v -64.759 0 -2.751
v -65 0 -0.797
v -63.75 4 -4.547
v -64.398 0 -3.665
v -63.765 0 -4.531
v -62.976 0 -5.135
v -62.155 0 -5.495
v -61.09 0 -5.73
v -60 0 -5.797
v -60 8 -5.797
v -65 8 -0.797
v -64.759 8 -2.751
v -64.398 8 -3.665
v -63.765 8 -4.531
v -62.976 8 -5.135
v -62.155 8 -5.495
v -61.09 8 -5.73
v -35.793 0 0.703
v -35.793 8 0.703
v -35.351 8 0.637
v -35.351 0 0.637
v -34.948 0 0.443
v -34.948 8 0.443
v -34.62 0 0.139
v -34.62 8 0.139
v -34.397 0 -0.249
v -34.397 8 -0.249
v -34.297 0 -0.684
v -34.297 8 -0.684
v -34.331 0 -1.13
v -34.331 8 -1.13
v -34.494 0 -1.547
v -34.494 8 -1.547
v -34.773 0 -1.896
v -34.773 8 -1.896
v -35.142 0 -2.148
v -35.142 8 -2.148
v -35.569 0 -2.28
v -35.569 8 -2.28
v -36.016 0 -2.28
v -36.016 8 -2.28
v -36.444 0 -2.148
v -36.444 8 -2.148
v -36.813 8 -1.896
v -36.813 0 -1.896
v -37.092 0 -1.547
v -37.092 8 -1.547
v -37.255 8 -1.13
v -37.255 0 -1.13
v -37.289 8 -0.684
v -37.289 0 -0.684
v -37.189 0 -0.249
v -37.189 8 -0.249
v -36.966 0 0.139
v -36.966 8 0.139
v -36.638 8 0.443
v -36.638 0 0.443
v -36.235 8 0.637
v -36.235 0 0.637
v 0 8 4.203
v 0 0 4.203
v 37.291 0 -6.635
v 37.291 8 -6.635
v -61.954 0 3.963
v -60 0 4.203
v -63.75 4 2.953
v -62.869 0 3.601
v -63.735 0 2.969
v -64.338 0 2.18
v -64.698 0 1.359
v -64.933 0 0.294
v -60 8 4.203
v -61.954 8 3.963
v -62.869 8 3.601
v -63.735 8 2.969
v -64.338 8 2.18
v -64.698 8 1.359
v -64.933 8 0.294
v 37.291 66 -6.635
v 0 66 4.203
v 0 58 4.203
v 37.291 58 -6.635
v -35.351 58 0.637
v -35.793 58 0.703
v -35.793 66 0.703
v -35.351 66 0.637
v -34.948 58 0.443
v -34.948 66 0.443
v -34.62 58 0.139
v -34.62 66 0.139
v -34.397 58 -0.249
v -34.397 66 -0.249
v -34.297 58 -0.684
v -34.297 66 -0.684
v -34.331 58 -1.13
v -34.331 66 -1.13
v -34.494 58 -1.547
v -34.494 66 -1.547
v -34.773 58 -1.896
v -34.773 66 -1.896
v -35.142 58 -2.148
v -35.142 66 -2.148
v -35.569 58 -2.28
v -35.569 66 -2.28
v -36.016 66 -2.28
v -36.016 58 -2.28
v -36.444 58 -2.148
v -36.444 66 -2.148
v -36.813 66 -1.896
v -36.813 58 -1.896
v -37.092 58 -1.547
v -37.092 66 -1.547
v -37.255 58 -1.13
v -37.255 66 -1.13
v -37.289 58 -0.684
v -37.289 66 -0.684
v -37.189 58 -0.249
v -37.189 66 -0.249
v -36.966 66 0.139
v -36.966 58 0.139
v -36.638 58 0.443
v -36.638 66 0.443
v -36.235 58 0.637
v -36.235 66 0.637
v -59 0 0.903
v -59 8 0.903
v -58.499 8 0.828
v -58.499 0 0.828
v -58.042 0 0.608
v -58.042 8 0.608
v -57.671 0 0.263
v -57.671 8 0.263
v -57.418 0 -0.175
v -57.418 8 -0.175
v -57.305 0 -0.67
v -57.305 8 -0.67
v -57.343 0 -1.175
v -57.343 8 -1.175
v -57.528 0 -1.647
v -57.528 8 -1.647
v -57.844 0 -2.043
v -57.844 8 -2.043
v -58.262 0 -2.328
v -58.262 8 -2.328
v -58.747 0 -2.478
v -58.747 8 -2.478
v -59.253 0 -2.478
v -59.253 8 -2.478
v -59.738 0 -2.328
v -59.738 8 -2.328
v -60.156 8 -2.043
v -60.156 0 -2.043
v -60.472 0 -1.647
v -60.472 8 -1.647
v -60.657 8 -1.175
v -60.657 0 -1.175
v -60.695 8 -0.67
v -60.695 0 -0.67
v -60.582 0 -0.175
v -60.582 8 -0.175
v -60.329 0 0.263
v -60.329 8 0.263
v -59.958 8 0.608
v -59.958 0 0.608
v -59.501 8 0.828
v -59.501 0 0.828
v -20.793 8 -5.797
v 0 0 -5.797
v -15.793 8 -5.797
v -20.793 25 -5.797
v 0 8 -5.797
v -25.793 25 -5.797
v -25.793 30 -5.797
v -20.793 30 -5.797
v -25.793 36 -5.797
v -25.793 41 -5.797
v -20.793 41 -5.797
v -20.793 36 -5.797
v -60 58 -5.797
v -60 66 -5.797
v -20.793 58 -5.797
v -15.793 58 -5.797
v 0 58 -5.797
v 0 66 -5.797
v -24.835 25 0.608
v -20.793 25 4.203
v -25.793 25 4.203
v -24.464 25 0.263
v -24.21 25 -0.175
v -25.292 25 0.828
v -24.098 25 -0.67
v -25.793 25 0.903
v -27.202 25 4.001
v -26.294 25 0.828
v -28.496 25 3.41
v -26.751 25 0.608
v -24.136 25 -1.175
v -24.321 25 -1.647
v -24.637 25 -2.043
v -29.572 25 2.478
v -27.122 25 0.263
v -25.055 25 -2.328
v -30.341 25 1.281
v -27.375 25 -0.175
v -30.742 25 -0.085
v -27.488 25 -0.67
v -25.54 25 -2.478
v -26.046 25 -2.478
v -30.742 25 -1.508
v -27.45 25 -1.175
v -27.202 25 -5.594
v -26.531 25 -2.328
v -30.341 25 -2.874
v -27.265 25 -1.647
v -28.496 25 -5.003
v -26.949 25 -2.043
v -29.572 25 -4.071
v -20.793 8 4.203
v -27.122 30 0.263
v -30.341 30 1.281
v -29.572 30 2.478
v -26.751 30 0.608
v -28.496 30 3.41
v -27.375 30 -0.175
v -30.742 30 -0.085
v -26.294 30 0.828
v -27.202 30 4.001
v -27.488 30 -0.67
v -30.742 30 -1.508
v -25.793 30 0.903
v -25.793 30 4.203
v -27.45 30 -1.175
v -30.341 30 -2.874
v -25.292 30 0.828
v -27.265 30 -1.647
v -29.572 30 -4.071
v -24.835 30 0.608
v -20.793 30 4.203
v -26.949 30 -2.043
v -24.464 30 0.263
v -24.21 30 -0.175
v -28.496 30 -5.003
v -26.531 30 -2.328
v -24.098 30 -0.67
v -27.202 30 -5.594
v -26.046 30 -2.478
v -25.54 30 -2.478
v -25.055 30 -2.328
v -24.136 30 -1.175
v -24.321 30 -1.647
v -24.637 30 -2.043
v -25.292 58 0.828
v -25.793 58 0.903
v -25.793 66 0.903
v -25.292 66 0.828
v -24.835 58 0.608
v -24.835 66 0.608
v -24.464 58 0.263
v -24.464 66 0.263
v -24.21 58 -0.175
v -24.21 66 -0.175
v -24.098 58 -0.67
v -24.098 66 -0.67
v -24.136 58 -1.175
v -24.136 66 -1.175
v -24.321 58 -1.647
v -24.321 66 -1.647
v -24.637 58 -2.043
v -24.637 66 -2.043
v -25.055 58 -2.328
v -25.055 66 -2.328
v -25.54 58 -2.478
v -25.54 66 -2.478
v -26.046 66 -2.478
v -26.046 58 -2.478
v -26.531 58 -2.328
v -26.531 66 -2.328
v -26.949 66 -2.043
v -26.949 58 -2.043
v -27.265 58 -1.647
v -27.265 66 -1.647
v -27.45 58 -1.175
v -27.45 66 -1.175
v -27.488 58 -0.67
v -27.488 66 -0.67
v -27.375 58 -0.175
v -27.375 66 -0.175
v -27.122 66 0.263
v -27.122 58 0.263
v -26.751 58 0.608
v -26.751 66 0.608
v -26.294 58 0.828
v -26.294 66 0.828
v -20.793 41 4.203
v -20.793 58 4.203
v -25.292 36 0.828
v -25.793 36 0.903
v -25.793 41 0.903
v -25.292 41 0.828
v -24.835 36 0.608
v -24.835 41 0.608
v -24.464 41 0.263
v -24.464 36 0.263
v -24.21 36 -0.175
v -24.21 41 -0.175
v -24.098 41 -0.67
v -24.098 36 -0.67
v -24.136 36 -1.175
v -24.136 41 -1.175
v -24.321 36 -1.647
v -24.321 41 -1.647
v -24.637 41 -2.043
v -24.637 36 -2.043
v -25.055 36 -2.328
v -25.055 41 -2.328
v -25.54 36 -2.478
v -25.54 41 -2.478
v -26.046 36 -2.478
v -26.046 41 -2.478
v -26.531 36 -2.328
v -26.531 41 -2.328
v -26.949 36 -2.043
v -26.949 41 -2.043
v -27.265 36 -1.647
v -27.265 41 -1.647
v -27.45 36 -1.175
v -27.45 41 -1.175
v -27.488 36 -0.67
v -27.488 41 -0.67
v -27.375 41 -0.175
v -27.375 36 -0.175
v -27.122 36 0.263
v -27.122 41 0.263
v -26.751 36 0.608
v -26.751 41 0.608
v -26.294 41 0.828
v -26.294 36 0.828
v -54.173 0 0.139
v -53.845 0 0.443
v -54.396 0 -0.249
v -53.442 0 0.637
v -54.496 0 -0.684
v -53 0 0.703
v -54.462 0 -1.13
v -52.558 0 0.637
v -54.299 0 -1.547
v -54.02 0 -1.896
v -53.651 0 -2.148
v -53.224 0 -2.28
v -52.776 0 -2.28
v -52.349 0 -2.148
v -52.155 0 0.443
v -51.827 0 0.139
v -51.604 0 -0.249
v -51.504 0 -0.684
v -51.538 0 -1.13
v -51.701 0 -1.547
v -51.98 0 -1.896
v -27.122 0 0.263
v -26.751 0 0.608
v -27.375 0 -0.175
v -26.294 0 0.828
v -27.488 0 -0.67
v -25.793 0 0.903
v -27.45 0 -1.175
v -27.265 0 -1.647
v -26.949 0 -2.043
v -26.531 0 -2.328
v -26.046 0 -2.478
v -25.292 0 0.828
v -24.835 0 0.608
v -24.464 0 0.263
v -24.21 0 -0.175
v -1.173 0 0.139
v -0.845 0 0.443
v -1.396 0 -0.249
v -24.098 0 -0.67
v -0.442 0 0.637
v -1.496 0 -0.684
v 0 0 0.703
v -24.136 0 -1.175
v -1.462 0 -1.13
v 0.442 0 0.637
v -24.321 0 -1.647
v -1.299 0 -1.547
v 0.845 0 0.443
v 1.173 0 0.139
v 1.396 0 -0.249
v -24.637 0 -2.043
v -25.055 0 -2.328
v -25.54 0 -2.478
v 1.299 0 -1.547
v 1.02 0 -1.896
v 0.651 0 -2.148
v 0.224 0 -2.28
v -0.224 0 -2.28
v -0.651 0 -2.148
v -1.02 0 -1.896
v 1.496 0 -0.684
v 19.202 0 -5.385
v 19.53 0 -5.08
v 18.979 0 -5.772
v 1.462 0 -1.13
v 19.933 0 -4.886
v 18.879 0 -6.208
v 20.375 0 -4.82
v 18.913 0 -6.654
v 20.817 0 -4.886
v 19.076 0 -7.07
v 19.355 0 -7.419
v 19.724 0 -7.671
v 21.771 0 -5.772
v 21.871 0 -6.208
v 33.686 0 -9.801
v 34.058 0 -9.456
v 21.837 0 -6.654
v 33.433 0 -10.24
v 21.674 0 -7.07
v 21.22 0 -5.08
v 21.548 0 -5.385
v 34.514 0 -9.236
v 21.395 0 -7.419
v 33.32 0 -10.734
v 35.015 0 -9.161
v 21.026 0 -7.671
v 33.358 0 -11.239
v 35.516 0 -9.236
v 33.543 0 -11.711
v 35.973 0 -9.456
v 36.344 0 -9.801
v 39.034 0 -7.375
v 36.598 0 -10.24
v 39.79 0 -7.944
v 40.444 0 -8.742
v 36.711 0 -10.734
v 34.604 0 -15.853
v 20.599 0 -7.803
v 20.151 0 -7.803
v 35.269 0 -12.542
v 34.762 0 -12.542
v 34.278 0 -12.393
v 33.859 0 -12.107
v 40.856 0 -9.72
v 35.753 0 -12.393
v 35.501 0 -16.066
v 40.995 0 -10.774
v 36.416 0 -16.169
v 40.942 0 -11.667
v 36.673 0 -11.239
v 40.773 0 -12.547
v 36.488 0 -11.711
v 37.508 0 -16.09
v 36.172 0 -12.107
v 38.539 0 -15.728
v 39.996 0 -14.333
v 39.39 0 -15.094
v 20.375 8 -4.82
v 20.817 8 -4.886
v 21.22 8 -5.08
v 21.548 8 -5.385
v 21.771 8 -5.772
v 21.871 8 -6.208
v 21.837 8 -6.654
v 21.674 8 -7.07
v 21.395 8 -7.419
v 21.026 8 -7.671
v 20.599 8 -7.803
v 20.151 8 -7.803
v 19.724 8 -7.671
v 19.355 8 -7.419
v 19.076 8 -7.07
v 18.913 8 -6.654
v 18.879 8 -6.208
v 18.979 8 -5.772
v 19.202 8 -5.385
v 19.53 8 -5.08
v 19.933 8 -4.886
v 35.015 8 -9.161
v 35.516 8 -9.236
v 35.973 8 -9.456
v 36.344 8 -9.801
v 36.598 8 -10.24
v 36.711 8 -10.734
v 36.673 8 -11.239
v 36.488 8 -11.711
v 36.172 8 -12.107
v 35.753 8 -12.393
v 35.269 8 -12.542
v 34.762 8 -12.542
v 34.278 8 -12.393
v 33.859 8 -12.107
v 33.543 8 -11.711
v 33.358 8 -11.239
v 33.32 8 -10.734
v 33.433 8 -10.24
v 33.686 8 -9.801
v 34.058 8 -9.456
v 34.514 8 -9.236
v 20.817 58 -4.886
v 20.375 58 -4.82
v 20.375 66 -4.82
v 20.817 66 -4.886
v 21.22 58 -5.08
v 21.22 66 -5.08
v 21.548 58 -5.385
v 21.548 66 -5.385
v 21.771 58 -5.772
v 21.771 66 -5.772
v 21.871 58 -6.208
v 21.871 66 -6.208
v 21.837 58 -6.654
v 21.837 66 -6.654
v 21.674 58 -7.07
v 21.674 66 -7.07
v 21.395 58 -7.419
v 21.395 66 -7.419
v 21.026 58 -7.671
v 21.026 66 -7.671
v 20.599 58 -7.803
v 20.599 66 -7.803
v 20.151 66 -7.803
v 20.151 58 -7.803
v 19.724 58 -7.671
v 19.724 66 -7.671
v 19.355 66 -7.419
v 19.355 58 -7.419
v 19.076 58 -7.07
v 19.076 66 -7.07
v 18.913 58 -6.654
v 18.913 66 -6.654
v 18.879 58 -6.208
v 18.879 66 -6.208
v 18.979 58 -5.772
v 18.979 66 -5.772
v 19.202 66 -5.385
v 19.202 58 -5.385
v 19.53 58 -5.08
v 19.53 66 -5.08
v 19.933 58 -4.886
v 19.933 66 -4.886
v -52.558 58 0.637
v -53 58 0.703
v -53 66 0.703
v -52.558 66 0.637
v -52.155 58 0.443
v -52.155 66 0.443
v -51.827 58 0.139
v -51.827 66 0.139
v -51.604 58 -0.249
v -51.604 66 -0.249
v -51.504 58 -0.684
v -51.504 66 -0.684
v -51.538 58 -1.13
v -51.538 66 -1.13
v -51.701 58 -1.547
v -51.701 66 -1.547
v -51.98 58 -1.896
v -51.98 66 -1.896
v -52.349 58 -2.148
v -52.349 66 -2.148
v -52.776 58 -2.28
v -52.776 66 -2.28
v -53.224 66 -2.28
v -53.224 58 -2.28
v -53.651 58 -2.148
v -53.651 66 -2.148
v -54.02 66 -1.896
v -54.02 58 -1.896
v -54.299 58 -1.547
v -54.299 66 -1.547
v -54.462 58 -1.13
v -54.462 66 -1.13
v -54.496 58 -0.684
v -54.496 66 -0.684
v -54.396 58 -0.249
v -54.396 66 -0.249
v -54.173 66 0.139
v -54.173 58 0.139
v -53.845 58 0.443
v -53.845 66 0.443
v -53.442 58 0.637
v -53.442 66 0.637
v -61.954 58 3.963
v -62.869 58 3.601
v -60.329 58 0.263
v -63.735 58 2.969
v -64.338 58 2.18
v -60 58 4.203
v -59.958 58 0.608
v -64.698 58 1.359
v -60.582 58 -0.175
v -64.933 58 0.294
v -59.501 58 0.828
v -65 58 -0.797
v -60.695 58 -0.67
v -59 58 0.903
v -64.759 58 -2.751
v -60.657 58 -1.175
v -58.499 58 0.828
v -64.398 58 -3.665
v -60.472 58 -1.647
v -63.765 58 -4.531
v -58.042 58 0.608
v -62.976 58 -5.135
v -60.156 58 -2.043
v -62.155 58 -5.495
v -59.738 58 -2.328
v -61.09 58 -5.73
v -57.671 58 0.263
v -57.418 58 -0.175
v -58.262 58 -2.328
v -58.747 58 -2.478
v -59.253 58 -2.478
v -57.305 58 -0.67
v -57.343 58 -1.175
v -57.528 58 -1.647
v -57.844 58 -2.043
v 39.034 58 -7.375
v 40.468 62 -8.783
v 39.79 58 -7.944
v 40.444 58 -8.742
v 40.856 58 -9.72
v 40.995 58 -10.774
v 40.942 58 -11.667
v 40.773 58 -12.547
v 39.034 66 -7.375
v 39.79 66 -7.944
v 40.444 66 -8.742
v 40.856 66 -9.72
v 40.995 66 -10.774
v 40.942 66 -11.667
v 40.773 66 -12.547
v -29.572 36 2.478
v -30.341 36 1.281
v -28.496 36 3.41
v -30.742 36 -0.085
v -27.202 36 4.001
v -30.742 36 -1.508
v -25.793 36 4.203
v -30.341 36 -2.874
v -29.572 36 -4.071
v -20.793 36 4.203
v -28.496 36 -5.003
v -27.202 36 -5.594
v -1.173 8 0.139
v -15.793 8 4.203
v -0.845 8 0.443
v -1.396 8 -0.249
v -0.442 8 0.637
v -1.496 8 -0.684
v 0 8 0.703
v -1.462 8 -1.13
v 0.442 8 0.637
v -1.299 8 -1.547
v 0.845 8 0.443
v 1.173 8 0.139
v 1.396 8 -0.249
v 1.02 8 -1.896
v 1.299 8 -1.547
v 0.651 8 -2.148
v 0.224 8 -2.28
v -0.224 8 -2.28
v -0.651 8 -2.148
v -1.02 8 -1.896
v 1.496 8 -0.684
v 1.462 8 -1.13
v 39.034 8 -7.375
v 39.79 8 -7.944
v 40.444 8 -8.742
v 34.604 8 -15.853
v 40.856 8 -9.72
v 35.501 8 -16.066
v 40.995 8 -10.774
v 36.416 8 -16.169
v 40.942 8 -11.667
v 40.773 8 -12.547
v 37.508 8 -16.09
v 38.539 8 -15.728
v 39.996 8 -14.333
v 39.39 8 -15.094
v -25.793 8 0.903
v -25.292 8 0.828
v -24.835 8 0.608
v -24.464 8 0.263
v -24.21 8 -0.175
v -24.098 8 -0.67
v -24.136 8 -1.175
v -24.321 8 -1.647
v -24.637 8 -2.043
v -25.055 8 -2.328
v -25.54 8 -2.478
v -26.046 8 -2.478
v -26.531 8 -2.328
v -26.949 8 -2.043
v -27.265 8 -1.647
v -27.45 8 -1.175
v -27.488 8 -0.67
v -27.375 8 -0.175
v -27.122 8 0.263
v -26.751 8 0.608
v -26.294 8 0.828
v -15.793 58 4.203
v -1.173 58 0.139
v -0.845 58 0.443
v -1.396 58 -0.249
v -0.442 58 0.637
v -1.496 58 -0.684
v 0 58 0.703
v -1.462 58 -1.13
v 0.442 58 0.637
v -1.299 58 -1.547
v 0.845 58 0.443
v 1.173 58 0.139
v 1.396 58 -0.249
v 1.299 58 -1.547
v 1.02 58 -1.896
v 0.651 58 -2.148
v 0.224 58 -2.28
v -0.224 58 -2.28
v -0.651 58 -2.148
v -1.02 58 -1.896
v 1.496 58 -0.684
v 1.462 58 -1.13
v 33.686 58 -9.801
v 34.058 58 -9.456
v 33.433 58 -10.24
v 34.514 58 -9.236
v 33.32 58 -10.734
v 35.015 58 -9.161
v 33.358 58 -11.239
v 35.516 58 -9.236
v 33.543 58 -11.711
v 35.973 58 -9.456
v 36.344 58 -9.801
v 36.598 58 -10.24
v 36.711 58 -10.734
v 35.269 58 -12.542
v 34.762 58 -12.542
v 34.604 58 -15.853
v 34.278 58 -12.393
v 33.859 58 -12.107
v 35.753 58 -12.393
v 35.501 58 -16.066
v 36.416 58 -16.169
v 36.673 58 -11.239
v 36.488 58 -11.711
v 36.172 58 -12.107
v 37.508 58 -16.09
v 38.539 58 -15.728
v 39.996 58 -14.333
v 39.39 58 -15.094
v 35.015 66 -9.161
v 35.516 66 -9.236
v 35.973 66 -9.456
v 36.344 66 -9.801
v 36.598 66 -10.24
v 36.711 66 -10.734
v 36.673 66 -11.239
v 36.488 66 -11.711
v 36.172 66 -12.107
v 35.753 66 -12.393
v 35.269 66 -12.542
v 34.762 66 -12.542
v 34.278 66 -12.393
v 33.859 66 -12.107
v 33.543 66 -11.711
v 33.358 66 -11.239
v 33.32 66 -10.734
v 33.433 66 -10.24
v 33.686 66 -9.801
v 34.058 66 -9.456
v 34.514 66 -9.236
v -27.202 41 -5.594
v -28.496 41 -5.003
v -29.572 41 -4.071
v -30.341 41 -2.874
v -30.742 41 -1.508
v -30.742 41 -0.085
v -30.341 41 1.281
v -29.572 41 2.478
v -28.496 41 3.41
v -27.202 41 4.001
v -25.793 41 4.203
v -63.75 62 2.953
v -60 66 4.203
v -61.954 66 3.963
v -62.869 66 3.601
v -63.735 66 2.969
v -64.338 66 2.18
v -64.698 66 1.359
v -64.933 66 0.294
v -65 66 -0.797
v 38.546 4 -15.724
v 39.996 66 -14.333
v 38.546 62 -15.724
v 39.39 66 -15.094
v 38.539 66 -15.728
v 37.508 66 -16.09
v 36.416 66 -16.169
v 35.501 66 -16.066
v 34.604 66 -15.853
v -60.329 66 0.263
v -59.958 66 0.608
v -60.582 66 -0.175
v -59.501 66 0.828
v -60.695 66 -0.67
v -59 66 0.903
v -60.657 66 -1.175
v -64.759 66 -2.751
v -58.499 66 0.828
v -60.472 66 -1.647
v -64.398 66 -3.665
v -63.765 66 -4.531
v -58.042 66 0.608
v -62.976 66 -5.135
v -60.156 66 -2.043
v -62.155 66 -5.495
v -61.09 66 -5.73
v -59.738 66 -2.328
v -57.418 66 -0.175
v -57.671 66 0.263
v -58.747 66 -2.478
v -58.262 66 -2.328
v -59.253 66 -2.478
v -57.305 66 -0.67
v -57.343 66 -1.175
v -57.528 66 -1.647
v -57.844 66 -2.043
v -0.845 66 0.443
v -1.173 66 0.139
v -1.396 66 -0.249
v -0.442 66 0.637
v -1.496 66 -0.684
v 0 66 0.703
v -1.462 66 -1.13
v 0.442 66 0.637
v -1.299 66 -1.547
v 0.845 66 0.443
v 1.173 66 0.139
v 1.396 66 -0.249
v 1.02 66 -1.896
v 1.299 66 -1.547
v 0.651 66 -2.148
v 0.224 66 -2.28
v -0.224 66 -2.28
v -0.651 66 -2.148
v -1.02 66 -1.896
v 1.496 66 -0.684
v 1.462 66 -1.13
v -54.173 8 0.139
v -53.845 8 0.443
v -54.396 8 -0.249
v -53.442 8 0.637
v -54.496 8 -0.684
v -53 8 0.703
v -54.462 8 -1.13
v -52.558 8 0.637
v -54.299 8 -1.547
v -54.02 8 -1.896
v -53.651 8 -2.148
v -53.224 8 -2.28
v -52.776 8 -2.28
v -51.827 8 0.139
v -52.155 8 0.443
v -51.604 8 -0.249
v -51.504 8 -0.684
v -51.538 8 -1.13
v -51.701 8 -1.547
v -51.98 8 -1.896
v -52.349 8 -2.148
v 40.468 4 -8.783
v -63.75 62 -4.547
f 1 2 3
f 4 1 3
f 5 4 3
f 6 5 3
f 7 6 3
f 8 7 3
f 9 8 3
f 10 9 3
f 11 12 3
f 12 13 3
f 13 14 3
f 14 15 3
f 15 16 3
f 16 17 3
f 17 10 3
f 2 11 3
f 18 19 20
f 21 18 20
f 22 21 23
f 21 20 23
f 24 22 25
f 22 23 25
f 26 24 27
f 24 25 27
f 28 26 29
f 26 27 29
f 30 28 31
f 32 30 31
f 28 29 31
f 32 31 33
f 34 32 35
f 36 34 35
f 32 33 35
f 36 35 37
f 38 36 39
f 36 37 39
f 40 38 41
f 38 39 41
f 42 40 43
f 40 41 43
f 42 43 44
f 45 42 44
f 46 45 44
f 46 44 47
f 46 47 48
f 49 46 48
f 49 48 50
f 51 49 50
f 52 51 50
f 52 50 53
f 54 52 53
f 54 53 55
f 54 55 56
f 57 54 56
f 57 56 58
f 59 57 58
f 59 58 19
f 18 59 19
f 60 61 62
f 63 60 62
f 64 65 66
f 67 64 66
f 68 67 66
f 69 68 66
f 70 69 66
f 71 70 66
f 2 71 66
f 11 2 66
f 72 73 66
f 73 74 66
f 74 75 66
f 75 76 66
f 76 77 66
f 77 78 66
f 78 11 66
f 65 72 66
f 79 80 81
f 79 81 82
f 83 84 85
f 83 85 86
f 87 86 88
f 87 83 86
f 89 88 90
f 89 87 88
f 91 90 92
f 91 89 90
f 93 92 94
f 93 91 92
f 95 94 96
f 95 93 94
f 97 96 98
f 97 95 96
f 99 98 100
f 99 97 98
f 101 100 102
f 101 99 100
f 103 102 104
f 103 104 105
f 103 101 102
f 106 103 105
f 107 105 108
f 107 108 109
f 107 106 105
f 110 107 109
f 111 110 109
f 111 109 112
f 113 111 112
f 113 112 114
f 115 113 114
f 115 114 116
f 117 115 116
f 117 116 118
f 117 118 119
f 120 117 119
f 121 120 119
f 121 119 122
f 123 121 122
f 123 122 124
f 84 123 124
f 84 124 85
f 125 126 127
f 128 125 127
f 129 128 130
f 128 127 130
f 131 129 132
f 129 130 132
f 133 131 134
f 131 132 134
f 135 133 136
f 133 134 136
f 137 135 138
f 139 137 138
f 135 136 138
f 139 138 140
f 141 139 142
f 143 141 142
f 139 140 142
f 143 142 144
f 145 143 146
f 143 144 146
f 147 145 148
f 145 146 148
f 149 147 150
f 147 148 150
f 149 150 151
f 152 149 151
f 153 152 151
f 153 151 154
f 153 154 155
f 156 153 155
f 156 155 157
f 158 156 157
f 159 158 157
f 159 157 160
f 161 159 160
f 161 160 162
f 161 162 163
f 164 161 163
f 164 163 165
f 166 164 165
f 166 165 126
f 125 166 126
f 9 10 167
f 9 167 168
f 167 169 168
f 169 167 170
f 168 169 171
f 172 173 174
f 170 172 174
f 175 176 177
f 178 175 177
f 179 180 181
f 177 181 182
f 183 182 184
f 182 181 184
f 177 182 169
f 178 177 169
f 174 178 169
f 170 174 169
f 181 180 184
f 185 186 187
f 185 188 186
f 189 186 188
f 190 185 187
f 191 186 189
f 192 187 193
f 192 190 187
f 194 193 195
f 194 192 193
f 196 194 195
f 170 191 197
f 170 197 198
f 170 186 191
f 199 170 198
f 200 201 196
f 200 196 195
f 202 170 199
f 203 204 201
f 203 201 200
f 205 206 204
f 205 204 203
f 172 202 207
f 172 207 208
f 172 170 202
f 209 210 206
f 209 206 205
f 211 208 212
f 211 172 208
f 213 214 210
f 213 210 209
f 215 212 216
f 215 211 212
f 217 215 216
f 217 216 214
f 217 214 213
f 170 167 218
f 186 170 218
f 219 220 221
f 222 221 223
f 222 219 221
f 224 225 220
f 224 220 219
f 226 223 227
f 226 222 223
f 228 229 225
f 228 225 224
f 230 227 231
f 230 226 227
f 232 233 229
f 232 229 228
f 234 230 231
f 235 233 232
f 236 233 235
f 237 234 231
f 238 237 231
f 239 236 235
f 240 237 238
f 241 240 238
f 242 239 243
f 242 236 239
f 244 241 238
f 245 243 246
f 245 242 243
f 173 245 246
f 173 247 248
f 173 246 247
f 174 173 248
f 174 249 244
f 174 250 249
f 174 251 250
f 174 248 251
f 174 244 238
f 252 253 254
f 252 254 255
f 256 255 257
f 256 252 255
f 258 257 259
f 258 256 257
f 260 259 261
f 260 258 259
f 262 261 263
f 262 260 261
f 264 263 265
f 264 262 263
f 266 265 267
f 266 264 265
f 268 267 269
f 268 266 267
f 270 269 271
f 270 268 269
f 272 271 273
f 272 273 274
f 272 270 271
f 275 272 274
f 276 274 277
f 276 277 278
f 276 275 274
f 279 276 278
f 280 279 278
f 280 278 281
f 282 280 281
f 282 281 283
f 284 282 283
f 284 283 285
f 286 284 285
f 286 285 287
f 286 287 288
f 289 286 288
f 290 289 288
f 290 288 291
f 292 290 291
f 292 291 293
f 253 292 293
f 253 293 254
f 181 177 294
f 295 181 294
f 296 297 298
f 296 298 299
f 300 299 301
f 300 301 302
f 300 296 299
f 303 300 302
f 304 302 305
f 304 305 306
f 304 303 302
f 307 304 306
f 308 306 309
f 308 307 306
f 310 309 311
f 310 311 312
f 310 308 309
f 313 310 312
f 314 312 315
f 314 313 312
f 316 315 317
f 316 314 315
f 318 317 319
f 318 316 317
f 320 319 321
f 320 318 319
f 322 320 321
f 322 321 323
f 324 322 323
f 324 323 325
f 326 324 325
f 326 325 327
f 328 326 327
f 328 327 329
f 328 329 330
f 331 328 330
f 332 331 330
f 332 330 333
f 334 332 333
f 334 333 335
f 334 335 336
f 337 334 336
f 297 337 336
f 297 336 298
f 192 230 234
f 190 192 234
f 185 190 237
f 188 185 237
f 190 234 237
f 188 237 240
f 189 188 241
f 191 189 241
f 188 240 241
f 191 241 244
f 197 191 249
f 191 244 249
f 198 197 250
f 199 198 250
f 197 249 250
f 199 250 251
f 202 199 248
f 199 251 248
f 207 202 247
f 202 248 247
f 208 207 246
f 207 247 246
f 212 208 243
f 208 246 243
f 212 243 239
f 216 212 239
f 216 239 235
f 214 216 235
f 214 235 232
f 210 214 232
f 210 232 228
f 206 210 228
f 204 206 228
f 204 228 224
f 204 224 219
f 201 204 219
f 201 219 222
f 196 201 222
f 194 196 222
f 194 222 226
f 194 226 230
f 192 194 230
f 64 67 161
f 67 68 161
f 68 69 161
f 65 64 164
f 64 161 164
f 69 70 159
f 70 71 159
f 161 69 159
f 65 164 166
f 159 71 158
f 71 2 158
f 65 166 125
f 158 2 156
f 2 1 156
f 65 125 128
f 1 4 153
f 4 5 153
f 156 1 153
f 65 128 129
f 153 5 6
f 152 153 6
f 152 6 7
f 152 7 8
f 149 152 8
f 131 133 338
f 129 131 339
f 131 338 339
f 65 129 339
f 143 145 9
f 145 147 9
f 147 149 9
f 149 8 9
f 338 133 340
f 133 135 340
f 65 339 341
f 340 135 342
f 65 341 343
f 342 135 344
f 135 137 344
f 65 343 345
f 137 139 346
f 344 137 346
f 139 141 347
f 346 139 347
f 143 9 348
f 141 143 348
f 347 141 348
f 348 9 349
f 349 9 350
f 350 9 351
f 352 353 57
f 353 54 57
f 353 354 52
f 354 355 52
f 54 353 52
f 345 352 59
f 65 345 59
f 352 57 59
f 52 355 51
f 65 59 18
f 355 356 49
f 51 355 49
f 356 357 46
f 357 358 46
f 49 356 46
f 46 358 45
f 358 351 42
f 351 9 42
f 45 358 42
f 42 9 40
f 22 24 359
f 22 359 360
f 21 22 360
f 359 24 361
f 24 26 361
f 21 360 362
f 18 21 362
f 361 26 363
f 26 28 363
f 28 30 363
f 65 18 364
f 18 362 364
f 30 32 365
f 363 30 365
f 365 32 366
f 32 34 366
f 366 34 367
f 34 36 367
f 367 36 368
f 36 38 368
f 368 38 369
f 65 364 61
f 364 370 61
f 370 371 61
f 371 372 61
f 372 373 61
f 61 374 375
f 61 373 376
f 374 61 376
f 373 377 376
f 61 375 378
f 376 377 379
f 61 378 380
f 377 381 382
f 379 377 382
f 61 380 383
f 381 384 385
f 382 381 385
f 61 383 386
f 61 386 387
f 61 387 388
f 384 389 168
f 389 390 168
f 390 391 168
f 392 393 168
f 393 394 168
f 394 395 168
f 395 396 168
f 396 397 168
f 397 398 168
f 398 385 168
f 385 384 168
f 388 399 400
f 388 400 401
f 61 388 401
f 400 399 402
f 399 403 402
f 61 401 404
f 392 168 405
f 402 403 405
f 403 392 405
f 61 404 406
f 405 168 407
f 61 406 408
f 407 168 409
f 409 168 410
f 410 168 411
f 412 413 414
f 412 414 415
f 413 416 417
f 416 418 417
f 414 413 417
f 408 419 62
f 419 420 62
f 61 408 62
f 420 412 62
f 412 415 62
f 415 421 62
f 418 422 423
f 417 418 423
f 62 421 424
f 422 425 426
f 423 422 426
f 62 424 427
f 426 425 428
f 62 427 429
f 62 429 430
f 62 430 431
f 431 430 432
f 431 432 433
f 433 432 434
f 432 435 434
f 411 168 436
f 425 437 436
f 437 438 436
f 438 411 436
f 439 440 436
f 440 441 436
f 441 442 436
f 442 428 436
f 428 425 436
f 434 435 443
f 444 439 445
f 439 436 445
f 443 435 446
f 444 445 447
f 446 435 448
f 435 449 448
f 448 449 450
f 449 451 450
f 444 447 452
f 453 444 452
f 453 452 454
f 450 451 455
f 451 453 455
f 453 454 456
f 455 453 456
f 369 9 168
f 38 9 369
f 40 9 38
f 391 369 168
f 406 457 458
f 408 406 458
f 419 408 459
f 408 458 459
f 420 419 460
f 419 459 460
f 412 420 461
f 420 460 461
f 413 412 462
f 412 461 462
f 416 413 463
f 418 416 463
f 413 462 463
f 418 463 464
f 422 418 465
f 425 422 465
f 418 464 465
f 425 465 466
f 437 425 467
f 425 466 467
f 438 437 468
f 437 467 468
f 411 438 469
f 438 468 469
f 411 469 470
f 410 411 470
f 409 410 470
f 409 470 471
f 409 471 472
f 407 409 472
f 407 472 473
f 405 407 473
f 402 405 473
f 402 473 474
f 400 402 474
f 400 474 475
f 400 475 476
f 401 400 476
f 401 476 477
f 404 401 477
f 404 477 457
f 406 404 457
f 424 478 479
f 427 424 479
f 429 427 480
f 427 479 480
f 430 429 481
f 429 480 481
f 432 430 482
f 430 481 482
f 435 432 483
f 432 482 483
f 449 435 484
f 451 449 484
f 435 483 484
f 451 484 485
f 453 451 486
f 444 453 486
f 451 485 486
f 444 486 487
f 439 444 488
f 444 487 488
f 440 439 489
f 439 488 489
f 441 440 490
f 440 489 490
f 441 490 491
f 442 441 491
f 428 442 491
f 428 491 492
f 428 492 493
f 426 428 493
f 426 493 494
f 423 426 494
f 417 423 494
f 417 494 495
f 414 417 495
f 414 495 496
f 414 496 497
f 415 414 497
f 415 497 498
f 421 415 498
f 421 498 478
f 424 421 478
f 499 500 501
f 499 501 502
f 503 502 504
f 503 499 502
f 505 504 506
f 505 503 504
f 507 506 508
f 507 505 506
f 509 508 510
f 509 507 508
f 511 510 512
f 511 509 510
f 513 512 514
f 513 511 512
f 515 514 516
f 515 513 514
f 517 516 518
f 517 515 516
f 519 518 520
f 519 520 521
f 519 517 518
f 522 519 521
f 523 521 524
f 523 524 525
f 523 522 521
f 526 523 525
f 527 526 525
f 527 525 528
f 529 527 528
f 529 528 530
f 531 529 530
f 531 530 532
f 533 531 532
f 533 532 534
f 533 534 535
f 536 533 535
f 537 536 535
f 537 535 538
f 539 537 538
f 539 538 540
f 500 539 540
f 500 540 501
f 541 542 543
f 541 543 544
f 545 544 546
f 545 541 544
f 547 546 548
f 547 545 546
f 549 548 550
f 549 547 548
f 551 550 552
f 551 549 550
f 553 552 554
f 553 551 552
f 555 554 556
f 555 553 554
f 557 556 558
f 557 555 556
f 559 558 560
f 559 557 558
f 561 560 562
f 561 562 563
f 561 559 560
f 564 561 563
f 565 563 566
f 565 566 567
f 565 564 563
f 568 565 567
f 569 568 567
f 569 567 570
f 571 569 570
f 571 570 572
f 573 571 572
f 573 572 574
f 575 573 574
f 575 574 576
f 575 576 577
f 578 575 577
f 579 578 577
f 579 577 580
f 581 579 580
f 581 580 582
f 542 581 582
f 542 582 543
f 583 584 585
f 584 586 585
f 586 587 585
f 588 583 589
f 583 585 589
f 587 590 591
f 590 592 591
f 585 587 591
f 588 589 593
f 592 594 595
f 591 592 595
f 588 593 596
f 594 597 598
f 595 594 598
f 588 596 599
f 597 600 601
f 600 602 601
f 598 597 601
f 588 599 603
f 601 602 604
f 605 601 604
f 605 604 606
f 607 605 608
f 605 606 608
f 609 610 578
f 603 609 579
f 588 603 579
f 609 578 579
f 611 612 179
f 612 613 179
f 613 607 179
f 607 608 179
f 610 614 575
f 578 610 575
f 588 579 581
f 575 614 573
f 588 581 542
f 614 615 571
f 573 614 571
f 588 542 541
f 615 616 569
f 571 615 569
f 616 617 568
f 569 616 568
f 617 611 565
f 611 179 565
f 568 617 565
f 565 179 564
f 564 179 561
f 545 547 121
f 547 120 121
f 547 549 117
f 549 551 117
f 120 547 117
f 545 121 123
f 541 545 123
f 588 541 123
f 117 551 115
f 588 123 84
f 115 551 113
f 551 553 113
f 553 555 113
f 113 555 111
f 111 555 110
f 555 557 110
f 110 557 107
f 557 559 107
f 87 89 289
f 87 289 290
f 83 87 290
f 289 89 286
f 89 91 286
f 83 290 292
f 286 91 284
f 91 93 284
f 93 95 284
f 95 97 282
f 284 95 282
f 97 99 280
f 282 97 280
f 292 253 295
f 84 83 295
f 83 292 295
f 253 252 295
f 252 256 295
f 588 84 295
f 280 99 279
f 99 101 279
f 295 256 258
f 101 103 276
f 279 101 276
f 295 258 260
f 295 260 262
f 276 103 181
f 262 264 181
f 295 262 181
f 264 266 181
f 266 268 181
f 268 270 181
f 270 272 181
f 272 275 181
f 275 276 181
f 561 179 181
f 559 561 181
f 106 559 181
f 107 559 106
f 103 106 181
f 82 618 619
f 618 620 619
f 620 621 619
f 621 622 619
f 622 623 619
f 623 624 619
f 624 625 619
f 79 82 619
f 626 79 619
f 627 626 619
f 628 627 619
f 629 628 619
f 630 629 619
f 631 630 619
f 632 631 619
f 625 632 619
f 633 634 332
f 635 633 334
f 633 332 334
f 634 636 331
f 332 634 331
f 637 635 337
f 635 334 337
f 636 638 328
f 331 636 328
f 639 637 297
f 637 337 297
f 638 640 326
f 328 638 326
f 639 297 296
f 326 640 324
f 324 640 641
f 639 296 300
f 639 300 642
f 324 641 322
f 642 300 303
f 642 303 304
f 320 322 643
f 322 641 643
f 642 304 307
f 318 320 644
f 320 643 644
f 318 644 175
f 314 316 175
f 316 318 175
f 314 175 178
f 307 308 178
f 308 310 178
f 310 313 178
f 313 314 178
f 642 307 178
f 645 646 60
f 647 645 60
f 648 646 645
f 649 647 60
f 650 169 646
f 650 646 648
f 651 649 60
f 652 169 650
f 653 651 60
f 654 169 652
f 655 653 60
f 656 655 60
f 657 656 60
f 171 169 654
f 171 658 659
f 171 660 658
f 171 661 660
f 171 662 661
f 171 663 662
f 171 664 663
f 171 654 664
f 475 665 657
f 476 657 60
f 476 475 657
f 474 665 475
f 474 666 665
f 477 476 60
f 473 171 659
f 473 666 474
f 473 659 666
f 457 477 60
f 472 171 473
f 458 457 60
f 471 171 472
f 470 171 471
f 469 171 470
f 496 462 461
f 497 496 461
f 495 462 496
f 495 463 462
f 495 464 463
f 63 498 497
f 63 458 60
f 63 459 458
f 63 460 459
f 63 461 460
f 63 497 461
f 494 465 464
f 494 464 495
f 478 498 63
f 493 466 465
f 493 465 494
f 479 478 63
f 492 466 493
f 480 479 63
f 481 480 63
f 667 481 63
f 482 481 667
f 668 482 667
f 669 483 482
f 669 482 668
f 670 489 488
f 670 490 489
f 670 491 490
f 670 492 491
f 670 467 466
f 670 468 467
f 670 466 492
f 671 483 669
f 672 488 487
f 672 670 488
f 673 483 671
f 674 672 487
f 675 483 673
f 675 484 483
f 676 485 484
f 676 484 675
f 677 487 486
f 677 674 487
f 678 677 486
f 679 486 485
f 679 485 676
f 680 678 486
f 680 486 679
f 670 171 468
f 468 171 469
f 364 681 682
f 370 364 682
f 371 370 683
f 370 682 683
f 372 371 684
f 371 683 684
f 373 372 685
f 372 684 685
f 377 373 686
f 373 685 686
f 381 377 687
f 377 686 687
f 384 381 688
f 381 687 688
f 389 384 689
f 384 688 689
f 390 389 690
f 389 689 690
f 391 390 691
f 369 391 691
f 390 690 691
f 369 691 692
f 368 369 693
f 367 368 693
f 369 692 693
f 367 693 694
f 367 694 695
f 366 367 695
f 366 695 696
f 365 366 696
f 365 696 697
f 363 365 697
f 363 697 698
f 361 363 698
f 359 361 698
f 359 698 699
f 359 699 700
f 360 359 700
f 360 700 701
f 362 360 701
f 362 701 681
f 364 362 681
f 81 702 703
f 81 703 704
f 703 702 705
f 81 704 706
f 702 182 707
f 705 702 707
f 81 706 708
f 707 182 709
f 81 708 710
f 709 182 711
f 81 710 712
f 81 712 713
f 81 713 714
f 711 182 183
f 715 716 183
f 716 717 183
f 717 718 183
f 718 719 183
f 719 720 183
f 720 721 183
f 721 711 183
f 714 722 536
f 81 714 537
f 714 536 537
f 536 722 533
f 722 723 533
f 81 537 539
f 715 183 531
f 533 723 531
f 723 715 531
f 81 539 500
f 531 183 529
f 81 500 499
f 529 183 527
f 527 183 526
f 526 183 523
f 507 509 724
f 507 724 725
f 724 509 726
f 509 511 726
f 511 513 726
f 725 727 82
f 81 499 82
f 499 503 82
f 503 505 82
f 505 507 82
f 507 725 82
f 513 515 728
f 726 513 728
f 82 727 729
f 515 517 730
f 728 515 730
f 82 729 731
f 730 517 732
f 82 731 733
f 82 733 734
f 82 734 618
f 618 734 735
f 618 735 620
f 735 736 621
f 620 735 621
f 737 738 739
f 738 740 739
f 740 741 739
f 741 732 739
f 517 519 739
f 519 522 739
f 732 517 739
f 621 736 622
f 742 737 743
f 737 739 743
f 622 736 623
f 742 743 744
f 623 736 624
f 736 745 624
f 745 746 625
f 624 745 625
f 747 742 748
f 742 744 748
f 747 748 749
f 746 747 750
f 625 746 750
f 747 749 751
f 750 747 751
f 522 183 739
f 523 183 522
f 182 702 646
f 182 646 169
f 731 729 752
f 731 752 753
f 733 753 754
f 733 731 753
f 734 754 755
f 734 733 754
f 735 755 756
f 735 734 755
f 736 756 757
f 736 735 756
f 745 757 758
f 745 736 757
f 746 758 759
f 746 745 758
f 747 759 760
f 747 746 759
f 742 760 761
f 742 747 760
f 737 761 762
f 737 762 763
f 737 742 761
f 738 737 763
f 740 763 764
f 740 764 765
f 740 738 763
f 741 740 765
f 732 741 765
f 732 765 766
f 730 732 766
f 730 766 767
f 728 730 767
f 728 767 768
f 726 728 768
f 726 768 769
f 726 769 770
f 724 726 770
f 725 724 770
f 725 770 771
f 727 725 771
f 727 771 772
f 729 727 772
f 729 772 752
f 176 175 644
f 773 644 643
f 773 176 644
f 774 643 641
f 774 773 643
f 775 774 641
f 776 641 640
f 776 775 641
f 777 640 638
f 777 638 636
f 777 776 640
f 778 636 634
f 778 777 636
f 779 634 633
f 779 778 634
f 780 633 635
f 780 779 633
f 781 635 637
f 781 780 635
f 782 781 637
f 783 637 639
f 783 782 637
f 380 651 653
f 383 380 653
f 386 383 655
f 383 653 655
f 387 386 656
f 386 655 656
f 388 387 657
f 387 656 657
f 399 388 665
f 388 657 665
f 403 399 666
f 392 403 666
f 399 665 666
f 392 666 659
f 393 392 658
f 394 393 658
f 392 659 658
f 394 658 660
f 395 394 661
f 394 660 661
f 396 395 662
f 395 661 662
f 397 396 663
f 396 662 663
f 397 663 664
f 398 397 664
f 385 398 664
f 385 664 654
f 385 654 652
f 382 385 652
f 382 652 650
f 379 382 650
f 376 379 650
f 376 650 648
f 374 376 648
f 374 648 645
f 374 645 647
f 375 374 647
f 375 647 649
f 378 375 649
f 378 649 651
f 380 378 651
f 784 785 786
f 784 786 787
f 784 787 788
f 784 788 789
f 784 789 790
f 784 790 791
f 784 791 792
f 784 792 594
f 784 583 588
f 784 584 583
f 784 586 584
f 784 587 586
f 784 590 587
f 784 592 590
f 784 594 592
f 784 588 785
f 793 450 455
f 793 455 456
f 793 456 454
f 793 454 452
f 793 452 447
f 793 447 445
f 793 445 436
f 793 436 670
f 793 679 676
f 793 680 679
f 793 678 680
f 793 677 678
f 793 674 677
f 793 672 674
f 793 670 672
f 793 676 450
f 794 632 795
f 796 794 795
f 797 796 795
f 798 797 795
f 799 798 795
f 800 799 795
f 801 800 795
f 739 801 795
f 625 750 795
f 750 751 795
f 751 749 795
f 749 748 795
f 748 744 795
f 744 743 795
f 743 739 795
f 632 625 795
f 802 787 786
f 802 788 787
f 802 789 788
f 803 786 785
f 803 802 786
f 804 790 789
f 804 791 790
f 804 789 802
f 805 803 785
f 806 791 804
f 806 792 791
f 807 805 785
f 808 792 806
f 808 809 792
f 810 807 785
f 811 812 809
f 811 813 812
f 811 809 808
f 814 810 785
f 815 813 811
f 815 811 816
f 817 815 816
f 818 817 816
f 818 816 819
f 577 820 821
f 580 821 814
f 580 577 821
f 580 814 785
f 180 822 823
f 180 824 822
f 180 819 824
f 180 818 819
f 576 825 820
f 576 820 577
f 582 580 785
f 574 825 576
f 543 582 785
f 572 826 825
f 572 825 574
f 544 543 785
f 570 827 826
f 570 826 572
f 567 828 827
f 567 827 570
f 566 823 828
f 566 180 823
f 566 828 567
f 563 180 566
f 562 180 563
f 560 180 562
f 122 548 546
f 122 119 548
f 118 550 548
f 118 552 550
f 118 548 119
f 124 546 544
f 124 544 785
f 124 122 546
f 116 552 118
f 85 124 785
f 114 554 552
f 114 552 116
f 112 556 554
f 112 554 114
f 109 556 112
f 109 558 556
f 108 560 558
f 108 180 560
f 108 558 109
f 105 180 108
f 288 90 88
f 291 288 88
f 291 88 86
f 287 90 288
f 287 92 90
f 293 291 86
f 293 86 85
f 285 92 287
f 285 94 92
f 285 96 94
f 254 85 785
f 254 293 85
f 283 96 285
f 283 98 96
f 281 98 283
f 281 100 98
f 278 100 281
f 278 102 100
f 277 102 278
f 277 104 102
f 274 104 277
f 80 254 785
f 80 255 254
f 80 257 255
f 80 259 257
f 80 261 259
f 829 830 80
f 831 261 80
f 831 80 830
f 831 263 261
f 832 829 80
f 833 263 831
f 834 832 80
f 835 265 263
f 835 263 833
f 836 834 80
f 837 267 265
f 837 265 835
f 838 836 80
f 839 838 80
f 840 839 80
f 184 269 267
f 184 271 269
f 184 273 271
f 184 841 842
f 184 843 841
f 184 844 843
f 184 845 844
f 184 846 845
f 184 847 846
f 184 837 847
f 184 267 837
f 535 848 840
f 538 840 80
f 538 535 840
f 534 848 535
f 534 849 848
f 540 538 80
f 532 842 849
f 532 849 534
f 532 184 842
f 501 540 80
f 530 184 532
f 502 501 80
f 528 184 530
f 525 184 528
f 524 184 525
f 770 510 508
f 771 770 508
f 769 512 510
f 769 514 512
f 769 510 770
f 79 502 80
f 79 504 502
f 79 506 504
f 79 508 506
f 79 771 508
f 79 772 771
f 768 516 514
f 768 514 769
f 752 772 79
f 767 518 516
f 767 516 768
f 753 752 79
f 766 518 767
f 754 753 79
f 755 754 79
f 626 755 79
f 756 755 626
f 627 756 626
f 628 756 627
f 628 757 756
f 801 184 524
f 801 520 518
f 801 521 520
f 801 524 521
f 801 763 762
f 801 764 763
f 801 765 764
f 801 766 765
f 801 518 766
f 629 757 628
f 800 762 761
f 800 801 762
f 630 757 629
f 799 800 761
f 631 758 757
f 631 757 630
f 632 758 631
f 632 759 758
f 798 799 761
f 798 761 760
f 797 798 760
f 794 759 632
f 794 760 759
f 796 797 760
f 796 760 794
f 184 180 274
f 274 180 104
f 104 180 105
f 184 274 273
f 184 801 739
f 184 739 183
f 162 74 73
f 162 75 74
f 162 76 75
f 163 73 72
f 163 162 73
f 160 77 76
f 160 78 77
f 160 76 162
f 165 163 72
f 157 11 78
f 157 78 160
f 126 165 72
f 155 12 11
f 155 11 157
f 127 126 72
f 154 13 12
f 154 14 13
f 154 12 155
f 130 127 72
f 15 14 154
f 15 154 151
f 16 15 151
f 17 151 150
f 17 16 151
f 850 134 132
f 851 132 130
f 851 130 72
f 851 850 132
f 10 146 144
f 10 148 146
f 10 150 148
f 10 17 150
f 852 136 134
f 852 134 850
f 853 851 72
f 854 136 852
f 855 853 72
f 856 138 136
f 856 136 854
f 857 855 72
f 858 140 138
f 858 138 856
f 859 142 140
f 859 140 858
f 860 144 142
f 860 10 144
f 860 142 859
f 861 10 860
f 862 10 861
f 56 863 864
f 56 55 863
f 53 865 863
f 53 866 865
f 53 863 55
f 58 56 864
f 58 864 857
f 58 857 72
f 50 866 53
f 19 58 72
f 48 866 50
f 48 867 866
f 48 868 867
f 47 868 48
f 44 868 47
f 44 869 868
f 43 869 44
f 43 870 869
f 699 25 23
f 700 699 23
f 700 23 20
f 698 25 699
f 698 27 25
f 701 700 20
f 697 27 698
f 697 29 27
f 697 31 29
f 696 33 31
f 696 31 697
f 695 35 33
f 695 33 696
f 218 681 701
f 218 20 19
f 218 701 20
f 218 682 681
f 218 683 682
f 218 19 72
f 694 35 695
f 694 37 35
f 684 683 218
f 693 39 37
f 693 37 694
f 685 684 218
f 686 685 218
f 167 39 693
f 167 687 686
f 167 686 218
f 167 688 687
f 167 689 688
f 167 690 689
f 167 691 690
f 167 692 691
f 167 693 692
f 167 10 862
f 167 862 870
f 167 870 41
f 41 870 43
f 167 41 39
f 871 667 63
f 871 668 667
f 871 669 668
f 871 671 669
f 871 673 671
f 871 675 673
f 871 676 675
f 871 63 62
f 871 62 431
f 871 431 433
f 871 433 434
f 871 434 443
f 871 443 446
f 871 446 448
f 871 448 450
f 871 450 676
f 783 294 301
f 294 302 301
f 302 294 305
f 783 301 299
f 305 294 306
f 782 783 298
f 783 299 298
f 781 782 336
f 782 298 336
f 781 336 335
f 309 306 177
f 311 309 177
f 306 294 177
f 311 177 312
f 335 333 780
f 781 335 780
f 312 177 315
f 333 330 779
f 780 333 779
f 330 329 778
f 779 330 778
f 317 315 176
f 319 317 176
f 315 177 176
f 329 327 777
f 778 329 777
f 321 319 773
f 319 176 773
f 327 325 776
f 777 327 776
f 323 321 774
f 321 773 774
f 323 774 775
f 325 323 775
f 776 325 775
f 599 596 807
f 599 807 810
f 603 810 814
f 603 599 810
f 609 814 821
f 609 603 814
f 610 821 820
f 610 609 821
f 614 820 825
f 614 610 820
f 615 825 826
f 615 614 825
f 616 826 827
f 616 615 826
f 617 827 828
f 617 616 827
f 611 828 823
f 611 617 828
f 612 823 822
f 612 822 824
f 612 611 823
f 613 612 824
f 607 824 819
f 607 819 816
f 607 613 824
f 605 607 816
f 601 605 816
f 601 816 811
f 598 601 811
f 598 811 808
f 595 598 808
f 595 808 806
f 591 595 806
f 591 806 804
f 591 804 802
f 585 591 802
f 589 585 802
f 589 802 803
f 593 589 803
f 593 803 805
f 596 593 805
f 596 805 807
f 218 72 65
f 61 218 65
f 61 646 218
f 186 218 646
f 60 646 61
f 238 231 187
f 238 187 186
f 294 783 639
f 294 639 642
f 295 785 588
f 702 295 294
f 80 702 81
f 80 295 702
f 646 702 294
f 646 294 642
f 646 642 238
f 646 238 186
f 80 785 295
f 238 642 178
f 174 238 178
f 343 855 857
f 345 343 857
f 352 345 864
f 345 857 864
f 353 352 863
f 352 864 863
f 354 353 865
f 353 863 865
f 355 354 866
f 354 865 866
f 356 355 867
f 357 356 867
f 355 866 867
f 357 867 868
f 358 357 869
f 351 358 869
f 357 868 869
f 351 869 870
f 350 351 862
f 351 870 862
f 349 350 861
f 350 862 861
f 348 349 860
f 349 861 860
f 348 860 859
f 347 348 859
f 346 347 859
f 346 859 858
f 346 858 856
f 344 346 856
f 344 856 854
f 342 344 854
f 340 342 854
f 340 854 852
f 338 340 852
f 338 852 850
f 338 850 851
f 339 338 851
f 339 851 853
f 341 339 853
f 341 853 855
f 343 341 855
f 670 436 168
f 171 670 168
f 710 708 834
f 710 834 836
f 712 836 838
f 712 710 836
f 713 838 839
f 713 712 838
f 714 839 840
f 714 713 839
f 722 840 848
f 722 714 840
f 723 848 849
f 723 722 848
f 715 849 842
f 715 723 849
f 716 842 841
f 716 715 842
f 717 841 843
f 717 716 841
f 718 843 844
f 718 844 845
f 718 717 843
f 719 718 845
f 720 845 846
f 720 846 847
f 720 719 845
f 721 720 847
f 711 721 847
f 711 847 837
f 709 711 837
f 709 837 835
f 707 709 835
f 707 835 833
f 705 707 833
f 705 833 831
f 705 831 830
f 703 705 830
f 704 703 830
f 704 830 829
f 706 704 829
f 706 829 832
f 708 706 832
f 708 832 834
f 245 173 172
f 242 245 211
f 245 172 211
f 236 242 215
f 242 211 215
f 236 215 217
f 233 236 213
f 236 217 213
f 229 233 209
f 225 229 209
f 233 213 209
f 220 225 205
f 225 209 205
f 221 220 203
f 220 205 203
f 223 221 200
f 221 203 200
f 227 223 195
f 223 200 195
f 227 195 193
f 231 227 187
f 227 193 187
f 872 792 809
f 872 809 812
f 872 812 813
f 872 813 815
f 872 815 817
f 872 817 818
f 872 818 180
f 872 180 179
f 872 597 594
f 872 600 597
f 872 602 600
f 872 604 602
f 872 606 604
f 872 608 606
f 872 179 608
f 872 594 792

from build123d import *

# Parameters (mm, degrees)
BOSS_EXTRUDE1_DEPTH = 8
SKETCH2_R           = 1.7
SKETCH2_R_2         = 1.5
CUT_EXTRUDE1_DEPTH  = 10
FILLET1_SIZE        = 5
SKETCH3_R           = 5
BOSS_EXTRUDE2_DEPTH = 22
SKETCH4_R           = 1.7
CUT_EXTRUDE2_DEPTH  = 74.393131138
BOSS_EXTRUDE4_DEPTH = 22
SKETCH9_R           = 1.7
CUT_EXTRUDE3_DEPTH  = 17
SKETCH10_W          = 5
SKETCH10_H          = 10
BOSS_EXTRUDE5_DEPTH = 3


with BuildPart() as part:
    # Sketch1 → Boss-Extrude1 (new body)
    with BuildSketch(Plane(origin=(0, 0, 0), x_dir=(1, 0, 0), z_dir=(0, 1, 0))):
        Polygon((0, 5.796570021), (-65, 5.796570021), (-65, -4.203429979), (0, -4.203429979), (42, 8.002969552), (39.5, 17.276398151), align=None)
    extrude(amount=BOSS_EXTRUDE1_DEPTH)

    # Sketch2 → Cut-Extrude1 (cut)
    with BuildSketch(Plane(origin=(0, 8, 0), x_dir=(1, 0, 0), z_dir=(0, 1, 0))):
        with Locations(Location((-59, 0.796570021, 0), (0, 0, 270))):
            Circle(SKETCH2_R)
        with Locations(Location((-53, 0.796570021, 0), (0, 0, 270))):
            Circle(SKETCH2_R_2)
        with Locations(Location((-35.792921067, 0.796570021, 0), (0, 0, 270))):
            Circle(SKETCH2_R_2)
        with Locations(Location((20.375, 6.319841926, 0), (0, 0, 270))):
            Circle(SKETCH2_R_2)
        with Locations(Location((35.015323176, 10.860923065, 0), (0, 0, 270))):
            Circle(SKETCH2_R)
        with Locations(Location((0, 0.796570021, 0), (0, 0, 270))):
            Circle(SKETCH2_R_2)
    extrude(amount=-CUT_EXTRUDE1_DEPTH, mode=Mode.SUBTRACT)

    # Fillet1
    # a fillet whose section is not a circle: 5 mm, written as the material it takes off along each edge
    with BuildSketch(Plane(origin=(-65, -12.5, 4.203429979), x_dir=(0, 0, -1), z_dir=(0, 1, 0)), Plane(origin=(-65, -12.5, -5.796570021), x_dir=(1, 0, 0), z_dir=(0, 1, 0))) as fillet1_piece_1:
        with BuildLine():
            Bezier((FILLET1_SIZE, 0), (0, 0), (0, -FILLET1_SIZE), weights=[1, 1, 1])
            Line((0, -FILLET1_SIZE), (0, 0))
            Line((0, 0), (FILLET1_SIZE, 0))
        make_face()
    extrude(amount=33, mode=Mode.SUBTRACT)

    # Fillet2
    # a fillet whose section is not a circle: 5 mm, written as the material it takes off along each edge
    with BuildSketch(Plane(origin=(39.5, -12.746283343, -17.276398151), x_dir=(-0.9602675163397548, 0, 0.27908116572545455), z_dir=(0, 1, 0))) as fillet2_piece_1:
        with BuildLine():
            Bezier((5.098513337, 0), (0, 0), (0.099464892, 5.097543034), weights=[1, 1, 1])
            Line((0.099464892, 5.097543034), (0, 0))
            Line((0, 0), (5.098513337, 0))
        make_face()
    extrude(amount=33.492566686, mode=Mode.SUBTRACT)
    with BuildSketch(Plane(origin=(42, -12.258475337, -8.002969552), x_dir=(-0.2602945720874772, 0, -0.9655292516241013), z_dir=(0, 1, 0))) as fillet2_piece_2:
        with BuildLine():
            Bezier((4.903390135, 0), (0, 0), (-0.09565831, 4.902456966), weights=[1, 1, 1])
            Line((-0.09565831, 4.902456966), (0, 0))
            Line((0, 0), (4.903390135, 0))
        make_face()
    extrude(amount=32.516950674, mode=Mode.SUBTRACT)

    # Sketch3 → Boss-Extrude2 (add)
    with BuildSketch(Plane(origin=(0, 8, 0), x_dir=(1, 0, 0), z_dir=(0, 1, 0))):
        with Locations(Location((-25.792921067, 0.796570021, 0), (0, 0, 270))):
            Circle(SKETCH3_R)
    extrude(amount=BOSS_EXTRUDE2_DEPTH)

    # Sketch4 → Cut-Extrude2 (cut, through all)
    with BuildSketch(Plane(origin=(0, 30, 0), x_dir=(1, 0, 0), z_dir=(0, 1, 0))):
        with Locations(Location((-25.792921067, 0.796570021, 0), (0, 0, 270))):
            Circle(SKETCH4_R)
    extrude(amount=-CUT_EXTRUDE2_DEPTH, mode=Mode.SUBTRACT)

    # Sketch6 → Boss-Extrude4 (add)
    with BuildSketch(Plane(origin=(0, 8, 0), x_dir=(1, 0, 0), z_dir=(0, 1, 0))):
        with BuildLine():
            Line((-15.792921067, 5.796570021), (-25.792921067, 5.796570021))
            ThreePointArc((-25.792921067, 5.796570021), (-20.792921067, 0.796570021), (-25.792921067, -4.203429979))
            Line((-25.792921067, -4.203429979), (-15.792921067, -4.203429979))
            Line((-15.792921067, -4.203429979), (-15.792921067, 5.796570021))
        make_face()
    extrude(amount=BOSS_EXTRUDE4_DEPTH)

    # Sketch9 → Cut-Extrude3 (cut)
    with BuildSketch(Plane(origin=(0, 25, 0), x_dir=(1, 0, 0), z_dir=(0, 1, 0))):
        with BuildLine():
            Line((-25.792921067, 5.796570021), (-20.792921067, 5.796570021))
            Line((-20.792921067, 5.796570021), (-20.792921067, -4.203429979))
            Line((-20.792921067, -4.203429979), (-25.792921067, -4.203429979))
            ThreePointArc((-25.792921067, -4.203429979), (-30.792921067, 0.796570021), (-25.792921067, 5.796570021))
        make_face()
        with Locations(Location((-25.792921067, 0.796570021, 0), (0, 0, 270))):
            Circle(SKETCH9_R, mode=Mode.SUBTRACT)
    extrude(amount=-CUT_EXTRUDE3_DEPTH, mode=Mode.SUBTRACT)

    # Sketch10 → Boss-Extrude5 (add)
    with BuildSketch(Plane(origin=(0, 30, 0), x_dir=(1, 0, 0), z_dir=(0, 1, 0))):
        with Locations((-18.292921067, 0.796570021)):
            Rectangle(SKETCH10_W, SKETCH10_H)
    extrude(amount=BOSS_EXTRUDE5_DEPTH)

    # Mirror1: part across plane


with BuildPart() as part_1:
    add(part.part)
    add(part.part.mirror(Plane.ZX.offset(33)))


solid = part_1.part
